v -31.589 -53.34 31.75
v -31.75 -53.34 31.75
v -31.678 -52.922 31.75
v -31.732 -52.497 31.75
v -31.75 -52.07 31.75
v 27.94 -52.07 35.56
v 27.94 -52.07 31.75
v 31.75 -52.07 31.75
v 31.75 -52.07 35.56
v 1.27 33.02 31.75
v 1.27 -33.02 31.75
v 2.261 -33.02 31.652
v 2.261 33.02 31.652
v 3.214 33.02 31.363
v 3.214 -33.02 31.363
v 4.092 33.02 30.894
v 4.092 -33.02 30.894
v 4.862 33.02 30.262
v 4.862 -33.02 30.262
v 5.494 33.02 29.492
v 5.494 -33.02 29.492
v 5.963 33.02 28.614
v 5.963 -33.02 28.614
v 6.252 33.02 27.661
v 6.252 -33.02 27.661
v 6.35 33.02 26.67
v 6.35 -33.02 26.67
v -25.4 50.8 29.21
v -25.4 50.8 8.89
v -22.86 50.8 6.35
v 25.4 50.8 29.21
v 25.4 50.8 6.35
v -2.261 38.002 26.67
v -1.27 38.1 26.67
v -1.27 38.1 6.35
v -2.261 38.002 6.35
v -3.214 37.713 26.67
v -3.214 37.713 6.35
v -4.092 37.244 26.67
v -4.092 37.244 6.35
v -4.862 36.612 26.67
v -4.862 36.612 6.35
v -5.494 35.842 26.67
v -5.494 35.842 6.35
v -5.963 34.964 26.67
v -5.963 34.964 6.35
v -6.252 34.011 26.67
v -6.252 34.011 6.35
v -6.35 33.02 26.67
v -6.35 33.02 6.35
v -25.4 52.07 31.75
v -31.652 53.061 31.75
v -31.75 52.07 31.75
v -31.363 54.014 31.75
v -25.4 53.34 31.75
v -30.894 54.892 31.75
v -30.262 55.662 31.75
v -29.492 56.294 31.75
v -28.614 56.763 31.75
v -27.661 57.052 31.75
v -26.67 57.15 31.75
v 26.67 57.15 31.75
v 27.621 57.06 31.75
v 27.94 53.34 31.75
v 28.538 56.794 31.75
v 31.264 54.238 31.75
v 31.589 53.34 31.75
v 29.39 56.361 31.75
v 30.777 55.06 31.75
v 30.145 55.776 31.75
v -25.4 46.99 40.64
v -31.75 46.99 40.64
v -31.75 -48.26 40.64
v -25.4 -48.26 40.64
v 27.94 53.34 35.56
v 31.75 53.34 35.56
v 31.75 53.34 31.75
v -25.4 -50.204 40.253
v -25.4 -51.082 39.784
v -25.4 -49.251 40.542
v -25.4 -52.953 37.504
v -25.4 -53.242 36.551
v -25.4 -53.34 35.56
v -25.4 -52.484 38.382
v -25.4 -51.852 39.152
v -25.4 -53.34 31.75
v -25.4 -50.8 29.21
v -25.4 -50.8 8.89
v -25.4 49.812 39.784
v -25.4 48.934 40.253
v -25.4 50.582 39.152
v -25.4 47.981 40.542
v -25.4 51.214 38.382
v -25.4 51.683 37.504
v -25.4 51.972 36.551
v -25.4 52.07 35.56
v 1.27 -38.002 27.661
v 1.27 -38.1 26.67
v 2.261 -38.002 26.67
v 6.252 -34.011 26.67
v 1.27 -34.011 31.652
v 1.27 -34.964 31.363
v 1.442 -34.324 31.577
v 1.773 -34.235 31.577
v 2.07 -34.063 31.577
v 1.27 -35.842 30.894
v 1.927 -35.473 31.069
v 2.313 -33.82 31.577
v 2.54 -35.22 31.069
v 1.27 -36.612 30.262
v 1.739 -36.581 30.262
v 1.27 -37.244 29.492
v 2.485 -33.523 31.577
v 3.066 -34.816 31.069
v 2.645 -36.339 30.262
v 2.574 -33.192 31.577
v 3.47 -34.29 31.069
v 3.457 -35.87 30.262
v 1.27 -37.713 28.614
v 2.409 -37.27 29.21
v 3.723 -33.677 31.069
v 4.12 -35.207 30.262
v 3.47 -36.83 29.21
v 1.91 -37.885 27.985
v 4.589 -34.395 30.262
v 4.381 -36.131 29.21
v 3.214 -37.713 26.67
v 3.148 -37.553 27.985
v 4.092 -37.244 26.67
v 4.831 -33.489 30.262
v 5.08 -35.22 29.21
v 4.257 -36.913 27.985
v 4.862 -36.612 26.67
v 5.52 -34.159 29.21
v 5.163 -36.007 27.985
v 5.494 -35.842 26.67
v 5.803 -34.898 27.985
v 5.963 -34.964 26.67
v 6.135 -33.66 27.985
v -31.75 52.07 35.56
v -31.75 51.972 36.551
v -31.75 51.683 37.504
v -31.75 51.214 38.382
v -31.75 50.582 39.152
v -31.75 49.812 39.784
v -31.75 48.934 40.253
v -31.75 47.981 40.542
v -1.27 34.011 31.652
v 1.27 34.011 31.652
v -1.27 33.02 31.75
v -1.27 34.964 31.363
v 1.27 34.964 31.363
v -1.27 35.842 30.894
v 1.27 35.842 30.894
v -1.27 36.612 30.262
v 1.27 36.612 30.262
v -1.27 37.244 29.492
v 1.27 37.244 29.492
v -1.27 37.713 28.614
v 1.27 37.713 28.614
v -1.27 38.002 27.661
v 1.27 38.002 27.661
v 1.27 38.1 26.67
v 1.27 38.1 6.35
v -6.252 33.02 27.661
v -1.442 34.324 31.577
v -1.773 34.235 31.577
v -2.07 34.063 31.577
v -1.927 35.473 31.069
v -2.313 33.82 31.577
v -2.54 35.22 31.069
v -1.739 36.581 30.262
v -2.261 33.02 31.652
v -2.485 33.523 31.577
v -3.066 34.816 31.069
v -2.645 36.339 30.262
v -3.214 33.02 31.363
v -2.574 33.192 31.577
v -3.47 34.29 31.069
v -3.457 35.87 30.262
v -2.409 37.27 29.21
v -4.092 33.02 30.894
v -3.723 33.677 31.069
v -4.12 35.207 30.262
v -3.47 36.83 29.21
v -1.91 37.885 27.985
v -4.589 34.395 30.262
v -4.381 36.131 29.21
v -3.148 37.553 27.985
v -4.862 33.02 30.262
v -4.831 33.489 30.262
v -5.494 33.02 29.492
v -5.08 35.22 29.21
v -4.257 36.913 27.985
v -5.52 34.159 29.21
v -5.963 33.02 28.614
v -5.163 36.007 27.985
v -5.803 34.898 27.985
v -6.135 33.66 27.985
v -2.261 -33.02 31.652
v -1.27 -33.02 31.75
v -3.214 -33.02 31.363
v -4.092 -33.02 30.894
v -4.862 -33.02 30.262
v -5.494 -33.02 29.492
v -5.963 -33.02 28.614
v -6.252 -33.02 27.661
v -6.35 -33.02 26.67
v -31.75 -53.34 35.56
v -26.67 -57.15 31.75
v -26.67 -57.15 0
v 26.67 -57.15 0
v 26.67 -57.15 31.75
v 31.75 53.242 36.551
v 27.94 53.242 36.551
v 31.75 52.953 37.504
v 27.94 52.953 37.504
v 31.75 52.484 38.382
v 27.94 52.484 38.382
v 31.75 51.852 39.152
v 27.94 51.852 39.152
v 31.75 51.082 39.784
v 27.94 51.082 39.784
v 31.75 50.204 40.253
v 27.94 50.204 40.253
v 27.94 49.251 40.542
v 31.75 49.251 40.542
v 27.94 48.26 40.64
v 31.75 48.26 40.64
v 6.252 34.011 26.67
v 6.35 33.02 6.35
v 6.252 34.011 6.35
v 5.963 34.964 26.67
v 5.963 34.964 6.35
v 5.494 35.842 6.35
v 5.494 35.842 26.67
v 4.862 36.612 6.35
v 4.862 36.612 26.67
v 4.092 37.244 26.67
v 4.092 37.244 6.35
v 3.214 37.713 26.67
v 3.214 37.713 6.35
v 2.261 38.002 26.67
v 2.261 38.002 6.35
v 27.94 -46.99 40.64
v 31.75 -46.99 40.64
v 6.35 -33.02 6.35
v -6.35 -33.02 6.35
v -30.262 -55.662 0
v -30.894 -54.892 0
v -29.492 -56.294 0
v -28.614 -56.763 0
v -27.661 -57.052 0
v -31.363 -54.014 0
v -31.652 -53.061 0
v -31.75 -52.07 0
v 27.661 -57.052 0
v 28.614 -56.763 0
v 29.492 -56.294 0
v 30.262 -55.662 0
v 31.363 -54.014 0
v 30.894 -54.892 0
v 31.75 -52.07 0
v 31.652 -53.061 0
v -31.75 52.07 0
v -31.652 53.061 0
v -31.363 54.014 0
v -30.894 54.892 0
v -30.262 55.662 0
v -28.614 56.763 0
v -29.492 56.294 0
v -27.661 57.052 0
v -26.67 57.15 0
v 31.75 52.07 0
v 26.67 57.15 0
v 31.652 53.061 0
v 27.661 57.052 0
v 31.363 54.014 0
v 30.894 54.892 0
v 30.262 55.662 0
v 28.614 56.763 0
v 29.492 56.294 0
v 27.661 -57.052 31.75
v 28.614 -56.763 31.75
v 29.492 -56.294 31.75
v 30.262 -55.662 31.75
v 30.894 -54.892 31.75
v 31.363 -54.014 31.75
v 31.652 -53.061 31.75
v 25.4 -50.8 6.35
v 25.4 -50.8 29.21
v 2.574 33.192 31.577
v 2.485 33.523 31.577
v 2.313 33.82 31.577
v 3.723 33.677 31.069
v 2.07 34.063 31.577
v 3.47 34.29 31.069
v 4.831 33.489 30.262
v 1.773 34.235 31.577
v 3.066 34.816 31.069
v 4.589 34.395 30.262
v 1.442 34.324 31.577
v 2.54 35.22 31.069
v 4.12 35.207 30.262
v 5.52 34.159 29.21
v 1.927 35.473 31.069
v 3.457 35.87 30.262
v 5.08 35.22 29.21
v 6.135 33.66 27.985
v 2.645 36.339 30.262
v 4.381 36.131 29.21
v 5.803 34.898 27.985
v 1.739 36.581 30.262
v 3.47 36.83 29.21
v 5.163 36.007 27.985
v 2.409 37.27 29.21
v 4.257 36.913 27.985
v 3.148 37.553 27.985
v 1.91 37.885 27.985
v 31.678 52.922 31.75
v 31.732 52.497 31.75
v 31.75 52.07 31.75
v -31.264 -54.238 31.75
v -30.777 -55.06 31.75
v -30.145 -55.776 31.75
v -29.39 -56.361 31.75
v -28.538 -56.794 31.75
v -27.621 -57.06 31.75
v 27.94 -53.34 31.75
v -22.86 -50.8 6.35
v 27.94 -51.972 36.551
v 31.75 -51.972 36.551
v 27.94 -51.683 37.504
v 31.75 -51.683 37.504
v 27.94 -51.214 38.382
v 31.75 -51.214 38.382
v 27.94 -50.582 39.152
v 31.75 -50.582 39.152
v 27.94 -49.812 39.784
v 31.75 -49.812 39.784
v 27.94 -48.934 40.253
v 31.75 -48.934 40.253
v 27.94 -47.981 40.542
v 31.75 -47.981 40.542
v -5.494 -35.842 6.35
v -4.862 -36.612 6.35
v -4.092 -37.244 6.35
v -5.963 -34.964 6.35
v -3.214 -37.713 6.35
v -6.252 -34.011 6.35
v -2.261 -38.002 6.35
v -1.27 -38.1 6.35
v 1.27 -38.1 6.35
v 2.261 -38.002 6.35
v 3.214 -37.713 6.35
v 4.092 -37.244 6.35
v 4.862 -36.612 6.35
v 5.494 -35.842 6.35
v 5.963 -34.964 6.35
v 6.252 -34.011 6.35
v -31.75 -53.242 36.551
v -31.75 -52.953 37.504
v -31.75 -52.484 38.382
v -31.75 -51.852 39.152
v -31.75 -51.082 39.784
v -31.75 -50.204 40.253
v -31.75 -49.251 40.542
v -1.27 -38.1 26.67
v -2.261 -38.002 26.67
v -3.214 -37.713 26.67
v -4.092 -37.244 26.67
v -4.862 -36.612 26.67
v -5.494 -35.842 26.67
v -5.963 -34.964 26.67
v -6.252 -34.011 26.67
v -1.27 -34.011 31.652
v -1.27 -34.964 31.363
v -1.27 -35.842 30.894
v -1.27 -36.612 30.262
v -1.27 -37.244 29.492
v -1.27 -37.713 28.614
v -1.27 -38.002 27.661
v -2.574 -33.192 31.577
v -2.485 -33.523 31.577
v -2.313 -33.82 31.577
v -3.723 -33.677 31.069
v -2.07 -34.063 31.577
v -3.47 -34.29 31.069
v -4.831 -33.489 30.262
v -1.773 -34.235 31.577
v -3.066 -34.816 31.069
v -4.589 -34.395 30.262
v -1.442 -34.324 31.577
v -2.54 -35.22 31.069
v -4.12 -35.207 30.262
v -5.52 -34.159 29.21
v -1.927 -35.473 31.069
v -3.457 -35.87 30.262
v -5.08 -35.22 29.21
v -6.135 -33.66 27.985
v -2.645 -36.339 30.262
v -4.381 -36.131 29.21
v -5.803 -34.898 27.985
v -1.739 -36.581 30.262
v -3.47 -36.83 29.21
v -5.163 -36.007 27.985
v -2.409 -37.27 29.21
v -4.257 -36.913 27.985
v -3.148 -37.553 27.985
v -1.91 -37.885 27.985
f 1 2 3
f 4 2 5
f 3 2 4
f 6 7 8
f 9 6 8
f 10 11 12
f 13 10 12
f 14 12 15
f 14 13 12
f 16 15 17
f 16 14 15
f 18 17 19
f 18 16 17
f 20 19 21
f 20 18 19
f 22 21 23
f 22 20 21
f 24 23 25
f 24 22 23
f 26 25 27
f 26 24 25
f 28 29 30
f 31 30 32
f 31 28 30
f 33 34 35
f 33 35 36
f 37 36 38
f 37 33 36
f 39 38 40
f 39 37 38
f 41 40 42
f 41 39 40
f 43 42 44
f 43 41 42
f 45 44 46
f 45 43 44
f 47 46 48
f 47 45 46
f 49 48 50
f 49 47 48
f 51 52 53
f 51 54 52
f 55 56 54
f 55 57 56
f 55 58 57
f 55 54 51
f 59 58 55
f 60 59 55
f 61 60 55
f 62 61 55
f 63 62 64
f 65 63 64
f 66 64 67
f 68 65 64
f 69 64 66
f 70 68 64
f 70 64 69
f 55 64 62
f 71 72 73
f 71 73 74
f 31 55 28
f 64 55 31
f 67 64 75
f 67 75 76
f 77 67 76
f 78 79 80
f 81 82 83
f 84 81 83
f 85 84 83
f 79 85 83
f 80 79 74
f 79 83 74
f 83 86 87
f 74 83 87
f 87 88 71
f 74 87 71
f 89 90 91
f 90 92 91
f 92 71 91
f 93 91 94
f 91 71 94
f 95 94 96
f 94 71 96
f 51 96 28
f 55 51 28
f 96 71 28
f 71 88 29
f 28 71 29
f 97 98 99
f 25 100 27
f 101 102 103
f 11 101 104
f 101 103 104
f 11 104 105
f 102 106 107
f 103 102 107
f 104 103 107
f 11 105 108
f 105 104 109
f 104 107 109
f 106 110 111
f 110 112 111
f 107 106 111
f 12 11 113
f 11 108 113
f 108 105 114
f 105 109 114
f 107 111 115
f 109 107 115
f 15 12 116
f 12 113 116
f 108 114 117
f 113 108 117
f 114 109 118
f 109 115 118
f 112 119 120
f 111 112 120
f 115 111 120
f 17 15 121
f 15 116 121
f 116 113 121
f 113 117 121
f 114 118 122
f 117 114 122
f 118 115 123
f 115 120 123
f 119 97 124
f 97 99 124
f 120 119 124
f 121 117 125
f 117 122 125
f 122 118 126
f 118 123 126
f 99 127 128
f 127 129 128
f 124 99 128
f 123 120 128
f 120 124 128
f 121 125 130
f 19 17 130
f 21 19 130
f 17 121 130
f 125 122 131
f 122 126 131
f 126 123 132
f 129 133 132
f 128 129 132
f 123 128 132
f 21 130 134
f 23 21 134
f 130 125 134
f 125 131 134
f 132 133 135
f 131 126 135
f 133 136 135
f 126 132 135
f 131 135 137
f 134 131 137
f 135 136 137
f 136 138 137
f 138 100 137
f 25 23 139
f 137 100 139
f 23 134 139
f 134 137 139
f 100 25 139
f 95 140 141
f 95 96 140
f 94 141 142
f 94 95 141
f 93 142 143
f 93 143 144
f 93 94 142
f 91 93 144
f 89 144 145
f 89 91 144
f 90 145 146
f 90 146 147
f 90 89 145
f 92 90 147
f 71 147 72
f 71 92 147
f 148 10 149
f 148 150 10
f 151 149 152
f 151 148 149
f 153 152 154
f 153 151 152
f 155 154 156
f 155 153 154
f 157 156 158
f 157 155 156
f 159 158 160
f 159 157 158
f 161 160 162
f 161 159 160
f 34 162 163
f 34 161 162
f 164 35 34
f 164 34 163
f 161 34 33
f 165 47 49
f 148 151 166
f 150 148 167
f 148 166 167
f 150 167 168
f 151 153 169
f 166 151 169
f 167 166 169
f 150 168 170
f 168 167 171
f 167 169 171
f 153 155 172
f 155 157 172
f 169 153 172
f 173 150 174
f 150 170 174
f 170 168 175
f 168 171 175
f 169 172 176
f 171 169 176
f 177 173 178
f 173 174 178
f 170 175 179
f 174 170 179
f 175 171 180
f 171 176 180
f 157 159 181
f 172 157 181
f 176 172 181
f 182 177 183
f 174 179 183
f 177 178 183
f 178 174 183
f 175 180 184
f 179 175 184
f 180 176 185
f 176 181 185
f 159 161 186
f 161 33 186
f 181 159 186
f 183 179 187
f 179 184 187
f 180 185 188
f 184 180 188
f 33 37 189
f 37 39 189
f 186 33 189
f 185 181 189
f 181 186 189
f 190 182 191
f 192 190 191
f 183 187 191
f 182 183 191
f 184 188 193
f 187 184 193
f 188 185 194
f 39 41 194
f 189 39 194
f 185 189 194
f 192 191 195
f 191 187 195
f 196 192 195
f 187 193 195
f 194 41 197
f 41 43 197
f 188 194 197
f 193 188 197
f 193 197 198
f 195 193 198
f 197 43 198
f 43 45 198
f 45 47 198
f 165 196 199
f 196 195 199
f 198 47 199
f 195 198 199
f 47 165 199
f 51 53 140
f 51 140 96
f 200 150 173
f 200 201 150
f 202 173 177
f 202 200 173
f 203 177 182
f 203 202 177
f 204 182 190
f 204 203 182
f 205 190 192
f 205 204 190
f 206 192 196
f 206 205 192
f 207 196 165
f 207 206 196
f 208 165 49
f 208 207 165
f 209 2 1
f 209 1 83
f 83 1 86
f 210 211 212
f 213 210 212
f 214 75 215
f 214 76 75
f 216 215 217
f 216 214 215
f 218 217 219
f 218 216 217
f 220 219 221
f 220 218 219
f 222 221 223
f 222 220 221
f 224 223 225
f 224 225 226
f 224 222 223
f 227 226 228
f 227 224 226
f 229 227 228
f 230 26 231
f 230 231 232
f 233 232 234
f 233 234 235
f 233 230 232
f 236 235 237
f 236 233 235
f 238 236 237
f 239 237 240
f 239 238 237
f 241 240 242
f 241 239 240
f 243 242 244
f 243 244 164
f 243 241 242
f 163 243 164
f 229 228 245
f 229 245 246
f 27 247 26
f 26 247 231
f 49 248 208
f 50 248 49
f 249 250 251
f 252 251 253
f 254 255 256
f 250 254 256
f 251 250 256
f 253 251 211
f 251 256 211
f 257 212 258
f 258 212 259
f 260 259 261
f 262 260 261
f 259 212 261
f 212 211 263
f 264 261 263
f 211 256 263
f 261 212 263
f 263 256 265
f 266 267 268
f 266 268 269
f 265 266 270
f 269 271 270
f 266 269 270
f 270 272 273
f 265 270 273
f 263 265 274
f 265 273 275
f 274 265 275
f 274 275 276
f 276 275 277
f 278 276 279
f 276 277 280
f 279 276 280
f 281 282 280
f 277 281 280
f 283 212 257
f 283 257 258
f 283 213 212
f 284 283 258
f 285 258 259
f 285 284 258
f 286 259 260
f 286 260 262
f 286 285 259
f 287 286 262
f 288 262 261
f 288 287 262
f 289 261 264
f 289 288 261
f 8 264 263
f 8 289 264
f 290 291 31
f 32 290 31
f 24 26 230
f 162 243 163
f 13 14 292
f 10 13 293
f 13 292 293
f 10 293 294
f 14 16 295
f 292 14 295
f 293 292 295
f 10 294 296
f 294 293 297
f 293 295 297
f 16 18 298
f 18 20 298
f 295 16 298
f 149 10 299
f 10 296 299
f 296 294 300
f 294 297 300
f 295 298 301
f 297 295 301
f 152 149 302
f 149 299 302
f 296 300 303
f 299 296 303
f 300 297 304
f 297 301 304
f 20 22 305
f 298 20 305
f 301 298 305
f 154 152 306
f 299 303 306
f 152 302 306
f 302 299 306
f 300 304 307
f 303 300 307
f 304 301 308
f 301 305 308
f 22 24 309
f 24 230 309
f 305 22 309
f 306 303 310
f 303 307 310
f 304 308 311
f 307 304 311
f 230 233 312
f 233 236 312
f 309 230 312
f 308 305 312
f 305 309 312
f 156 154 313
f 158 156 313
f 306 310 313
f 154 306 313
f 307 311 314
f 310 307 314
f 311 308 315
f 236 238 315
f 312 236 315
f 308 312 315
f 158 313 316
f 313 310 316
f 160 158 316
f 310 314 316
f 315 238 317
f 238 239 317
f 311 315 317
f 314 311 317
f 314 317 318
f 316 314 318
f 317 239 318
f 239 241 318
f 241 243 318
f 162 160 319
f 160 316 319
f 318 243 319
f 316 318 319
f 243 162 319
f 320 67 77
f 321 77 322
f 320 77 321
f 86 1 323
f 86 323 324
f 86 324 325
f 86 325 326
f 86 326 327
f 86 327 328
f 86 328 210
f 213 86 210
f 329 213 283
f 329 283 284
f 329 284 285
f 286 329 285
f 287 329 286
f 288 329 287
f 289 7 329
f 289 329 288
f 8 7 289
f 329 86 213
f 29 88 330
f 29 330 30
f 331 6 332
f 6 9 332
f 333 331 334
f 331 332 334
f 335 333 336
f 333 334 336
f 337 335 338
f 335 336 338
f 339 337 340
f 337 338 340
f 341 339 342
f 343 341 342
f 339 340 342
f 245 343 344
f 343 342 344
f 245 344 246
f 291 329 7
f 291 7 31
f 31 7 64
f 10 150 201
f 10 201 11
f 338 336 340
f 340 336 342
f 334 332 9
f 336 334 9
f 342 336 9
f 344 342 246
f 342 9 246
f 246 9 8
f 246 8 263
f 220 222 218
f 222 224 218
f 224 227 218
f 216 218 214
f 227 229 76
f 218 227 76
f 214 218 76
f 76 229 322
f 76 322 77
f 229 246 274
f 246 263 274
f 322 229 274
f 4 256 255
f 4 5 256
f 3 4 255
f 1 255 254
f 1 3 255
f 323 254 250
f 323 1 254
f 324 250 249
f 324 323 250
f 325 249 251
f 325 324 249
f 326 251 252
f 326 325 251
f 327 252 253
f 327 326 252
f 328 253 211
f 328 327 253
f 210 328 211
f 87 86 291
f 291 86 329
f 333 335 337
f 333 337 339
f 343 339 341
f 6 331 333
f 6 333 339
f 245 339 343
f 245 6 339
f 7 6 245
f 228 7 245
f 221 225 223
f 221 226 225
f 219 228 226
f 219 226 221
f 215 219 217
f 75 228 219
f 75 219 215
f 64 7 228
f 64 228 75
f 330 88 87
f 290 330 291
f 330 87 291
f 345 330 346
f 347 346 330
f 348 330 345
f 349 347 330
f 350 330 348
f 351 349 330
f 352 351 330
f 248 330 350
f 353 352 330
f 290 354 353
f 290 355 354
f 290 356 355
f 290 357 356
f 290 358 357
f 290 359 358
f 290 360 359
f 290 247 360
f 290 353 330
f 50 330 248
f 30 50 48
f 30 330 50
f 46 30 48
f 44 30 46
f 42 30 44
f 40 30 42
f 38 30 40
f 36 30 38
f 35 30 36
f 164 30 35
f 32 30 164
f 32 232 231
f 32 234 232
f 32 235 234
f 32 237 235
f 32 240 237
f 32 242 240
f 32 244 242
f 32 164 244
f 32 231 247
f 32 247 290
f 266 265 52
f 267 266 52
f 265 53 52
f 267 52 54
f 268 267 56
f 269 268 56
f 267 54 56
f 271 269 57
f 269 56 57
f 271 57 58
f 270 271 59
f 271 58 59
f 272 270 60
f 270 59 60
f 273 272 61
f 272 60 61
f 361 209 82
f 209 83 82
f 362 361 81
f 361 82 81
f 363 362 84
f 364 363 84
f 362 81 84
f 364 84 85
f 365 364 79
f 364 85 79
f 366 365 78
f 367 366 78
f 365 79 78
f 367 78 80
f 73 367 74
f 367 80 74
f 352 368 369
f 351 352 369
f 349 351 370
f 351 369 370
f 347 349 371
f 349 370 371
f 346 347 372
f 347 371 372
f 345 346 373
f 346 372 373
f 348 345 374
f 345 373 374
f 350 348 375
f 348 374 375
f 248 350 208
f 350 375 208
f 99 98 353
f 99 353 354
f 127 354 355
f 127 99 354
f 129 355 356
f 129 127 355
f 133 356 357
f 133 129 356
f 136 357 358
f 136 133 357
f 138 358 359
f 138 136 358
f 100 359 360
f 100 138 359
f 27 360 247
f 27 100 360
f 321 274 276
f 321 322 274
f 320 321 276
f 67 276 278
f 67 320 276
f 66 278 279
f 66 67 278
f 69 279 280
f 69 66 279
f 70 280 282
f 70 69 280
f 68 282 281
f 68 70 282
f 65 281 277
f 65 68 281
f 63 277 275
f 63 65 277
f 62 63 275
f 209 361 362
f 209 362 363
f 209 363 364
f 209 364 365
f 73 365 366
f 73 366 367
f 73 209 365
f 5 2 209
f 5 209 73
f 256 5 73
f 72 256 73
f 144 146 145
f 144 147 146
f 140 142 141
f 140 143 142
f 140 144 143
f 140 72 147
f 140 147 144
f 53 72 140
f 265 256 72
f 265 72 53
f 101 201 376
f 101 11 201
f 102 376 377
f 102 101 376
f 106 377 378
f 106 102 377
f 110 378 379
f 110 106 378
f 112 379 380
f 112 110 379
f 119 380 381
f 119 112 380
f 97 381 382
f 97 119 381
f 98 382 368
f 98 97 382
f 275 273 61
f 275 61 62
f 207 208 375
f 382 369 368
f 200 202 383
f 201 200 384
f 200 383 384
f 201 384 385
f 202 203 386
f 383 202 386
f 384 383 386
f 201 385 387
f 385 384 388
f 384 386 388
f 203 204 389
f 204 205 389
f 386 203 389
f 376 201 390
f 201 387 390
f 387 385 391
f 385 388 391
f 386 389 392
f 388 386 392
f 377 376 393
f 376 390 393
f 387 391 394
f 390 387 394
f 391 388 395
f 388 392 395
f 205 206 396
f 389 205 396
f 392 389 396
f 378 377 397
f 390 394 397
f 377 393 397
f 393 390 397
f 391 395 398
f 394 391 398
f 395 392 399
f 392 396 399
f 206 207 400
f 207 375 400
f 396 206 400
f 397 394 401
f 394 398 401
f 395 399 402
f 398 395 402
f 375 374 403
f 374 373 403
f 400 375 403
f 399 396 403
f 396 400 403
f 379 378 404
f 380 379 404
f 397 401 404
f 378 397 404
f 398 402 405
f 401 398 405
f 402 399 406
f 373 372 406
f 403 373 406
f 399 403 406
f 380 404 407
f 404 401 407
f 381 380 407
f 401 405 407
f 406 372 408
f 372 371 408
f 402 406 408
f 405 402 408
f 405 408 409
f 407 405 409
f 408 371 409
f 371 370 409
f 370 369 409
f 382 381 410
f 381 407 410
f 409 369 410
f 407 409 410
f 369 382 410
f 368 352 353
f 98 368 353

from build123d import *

# Parameters (mm, degrees)
F0_W      = 63.5
F0_H      = 114.3
F1_DEPTH  = 31.75
F2_W      = 50.8
F2_H      = 101.6
F3_DEPTH  = 25.4
F4_W      = 12.7
F4_H      = 76.2
F5_DEPTH  = 25.4
F6_R      = 5.08
F7_SIZE   = 2.54
F8_R      = 5.08
F9_R      = 5.08
F10_W     = 6.35
F10_H     = 105.41
F10_W_2   = 3.81
F11_DEPTH = 8.89
F12_R     = 5.08


with BuildPart() as f1:
    # F0 (on Top) → F1 (new body)
    with BuildSketch(Plane.XY):
        Rectangle(F0_W, F0_H)
    extrude(amount=F1_DEPTH)

    # F2 (on face) → F3 (cut)
    with BuildSketch(Plane.XY.offset(31.75)):
        Rectangle(F2_W, F2_H)
    extrude(amount=-F3_DEPTH, mode=Mode.SUBTRACT)

    # F4 (on face) → F5 (join)
    with BuildSketch(Plane.XY.offset(6.35)):
        Rectangle(F4_W, F4_H)
    extrude(amount=F5_DEPTH)

    # F6
    f6_edges = [f1.edges().sort_by_distance(p)[0] for p in [
        (6.35, -38.1, 19.05),
        (-6.35, -38.1, 19.05),
        (6.35, 38.1, 19.05),
        (-6.35, 38.1, 19.05),
    ]]
    fillet(f6_edges, radius=F6_R)

    # F7
    f7_edges = [f1.edges().sort_by_distance(p)[0] for p in [
        (-25.4, 0, 6.35),
        (0, 50.8, 31.75),
        (25.4, 0, 31.75),
        (0, -50.8, 31.75),
    ]]
    chamfer(f7_edges, length=F7_SIZE)

    # F8
    f8_edges = [f1.edges().sort_by_distance(p)[0] for p in [
        (6.35, 0, 31.75),
        (-6.35, 0, 31.75),
    ]]
    fillet(f8_edges, radius=F8_R)

    # F9
    f9_edges = [f1.edges().sort_by_distance(p)[0] for p in [
        (-31.75, -57.15, 15.875),
        (31.75, -57.15, 15.875),
        (31.75, 57.15, 15.875),
        (-31.75, 57.15, 15.875),
    ]]
    fillet(f9_edges, radius=F9_R)

    # F10 (on face) → F11 (join)
    with BuildSketch(Plane.XY.offset(31.75)):
        with Locations((-28.575, -0.635)):
            Rectangle(F10_W, F10_H)
        with Locations((29.845, 0.635)):
            Rectangle(F10_W_2, F10_H)
    extrude(amount=F11_DEPTH)

    # F12
    f12_edges = [f1.edges().sort_by_distance(p)[0] for p in [
        (-28.575, -53.34, 40.64),
        (29.845, -52.07, 40.64),
        (-28.575, 52.07, 40.64),
        (29.845, 53.34, 40.64),
    ]]
    fillet(f12_edges, radius=F12_R)


solid = f1.part
